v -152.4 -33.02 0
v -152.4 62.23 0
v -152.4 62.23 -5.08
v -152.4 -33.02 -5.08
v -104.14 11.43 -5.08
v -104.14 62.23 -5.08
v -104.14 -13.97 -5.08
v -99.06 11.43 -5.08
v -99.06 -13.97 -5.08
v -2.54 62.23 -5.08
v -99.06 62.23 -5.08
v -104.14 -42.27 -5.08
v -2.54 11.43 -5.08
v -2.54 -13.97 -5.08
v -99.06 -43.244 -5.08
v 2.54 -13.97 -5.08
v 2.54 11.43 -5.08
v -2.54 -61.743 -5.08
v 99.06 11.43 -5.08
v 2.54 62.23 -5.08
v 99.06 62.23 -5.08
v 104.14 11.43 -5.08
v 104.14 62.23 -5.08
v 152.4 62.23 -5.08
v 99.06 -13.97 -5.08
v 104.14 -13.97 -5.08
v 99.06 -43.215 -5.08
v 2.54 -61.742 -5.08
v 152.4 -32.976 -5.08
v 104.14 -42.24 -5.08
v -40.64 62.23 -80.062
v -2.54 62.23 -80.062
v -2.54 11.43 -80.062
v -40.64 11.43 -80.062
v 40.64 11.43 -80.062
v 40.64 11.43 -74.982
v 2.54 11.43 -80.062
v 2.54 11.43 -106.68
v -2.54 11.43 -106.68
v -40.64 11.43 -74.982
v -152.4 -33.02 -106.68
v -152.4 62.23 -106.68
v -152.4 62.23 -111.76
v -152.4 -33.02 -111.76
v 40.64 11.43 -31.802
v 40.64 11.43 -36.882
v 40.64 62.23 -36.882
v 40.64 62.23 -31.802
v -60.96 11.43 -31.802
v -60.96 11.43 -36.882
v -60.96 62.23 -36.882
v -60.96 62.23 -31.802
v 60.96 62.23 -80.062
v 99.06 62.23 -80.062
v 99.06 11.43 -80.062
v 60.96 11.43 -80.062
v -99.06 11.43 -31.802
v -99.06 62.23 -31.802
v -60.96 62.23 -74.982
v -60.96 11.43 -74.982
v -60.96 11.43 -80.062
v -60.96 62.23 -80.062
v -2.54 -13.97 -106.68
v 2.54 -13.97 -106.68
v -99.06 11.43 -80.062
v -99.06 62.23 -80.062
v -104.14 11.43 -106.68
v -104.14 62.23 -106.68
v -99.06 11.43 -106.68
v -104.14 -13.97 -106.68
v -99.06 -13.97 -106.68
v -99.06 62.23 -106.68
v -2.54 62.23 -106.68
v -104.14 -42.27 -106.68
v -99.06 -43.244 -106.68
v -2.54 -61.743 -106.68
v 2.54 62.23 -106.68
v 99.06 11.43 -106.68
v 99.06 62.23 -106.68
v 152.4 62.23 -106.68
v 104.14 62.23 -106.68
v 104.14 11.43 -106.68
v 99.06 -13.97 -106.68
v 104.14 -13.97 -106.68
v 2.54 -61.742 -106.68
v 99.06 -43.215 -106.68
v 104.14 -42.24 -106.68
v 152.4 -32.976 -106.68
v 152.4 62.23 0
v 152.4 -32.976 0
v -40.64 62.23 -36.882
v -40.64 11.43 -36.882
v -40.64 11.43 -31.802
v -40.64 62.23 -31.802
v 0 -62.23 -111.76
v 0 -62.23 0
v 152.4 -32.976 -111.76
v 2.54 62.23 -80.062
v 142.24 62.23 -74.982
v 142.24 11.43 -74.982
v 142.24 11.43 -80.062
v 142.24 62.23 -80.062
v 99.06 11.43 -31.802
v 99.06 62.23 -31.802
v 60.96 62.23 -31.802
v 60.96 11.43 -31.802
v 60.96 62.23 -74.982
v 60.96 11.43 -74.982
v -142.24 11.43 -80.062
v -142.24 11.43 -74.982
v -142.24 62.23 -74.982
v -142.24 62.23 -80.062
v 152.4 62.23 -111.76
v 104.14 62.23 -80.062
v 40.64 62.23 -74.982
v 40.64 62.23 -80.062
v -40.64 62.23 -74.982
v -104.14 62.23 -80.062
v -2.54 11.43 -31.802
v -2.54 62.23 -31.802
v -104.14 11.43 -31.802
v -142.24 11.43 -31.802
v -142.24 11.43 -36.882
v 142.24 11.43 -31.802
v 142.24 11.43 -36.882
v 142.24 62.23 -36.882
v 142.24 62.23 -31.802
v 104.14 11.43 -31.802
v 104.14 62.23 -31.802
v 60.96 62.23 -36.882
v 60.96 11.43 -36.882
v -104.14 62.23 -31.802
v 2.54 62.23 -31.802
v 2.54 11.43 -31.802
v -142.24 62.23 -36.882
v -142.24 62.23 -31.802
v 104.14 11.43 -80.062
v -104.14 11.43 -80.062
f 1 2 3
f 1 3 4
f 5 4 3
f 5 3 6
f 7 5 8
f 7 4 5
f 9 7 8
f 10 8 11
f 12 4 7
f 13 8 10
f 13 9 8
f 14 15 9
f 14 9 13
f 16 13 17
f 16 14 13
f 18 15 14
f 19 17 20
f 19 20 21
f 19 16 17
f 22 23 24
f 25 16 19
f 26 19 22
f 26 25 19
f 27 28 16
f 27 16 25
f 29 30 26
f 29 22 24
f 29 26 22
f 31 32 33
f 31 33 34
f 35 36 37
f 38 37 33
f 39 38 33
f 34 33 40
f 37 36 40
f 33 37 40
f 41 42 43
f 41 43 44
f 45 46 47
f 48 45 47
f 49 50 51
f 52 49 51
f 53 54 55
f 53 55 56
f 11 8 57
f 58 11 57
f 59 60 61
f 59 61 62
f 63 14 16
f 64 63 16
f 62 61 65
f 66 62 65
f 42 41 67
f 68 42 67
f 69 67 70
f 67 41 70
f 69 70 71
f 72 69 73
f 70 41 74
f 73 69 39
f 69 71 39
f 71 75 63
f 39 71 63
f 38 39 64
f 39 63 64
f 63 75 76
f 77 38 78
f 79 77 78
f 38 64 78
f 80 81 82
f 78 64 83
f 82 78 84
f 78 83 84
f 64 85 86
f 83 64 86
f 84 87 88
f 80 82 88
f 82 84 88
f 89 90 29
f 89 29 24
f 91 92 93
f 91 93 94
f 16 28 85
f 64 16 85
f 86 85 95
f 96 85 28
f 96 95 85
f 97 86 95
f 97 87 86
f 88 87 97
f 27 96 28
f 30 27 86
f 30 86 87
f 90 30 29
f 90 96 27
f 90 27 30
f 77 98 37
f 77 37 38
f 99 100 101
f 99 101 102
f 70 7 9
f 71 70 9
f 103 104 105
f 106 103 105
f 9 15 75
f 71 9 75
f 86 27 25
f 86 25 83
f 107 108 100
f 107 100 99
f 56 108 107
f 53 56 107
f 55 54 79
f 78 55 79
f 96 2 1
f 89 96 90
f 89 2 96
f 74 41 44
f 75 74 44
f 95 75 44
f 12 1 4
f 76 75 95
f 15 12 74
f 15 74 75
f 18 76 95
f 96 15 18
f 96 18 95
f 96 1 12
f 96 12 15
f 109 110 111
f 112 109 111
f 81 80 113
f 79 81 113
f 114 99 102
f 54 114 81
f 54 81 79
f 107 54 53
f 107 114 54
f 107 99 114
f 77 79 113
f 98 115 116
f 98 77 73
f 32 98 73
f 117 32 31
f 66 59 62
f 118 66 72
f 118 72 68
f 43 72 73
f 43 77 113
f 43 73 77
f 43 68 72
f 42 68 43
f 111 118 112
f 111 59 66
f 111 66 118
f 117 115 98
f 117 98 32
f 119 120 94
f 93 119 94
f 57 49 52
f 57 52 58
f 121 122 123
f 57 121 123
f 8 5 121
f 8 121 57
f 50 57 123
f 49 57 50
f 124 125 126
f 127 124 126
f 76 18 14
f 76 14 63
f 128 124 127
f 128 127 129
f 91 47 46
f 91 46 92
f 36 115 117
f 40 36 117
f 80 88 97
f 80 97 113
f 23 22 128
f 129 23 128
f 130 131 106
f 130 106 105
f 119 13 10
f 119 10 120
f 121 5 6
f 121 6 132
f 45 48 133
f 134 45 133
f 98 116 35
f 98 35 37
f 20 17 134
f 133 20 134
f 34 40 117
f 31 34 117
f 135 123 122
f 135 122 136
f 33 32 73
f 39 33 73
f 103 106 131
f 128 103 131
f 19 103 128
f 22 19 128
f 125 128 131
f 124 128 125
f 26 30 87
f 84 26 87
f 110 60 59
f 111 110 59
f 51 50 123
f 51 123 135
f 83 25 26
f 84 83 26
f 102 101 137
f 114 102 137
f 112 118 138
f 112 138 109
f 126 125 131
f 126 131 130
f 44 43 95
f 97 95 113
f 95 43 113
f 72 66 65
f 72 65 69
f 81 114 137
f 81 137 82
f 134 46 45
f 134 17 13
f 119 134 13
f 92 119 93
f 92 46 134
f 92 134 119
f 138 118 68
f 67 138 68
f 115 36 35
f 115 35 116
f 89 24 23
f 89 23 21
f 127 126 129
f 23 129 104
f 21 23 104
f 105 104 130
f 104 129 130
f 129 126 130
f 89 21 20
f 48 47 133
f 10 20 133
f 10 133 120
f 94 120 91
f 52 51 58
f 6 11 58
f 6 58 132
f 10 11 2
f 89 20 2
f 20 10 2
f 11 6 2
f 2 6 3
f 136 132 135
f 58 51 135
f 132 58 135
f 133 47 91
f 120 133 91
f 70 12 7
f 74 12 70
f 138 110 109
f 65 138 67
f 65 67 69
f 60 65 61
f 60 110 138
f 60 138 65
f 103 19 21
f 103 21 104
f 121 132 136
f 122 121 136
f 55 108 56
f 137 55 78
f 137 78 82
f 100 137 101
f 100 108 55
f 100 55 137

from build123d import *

# Parameters (mm, degrees)
BOSS_EXTRUDE1_DEPTH     = 111.76
SKETCH5_W               = 304.8
SKETCH5_H               = 25.4
CUT_EXTRUDE3_DEPTH      = 101.6
CUT_EXTRUDE4_DEPTH      = 227.288199427
CUT_EXTRUDE4_DEPTH_BACK = 227.288199427
SKETCH3_W               = 96.52
SKETCH3_H               = 101.6
SKETCH3_W_2             = 48.26
CUT_EXTRUDE5_REACH      = 288.663
SKETCH6_W               = 38.1
SKETCH6_H               = 50.8
SKETCH7_W               = 81.28
SKETCH7_H               = 50.8
BOSS_EXTRUDE2_DEPTH     = 5.08


with BuildPart() as part:
    # Sketch1 → Boss-Extrude1 (new body)
    with BuildSketch(Plane.XY):
        Polygon((-152.4, 62.23), (-152.4, -33.02), (0, -62.23), (152.4, -32.976439839), (152.4, 62.23), align=None)
    extrude(amount=-BOSS_EXTRUDE1_DEPTH)

    # Sketch5 → Cut-Extrude3 (cut)
    with BuildSketch(Plane.XY.offset(-5.08)):
        with Locations((0, -1.27)):
            Rectangle(SKETCH5_W, SKETCH5_H)
    extrude(amount=-CUT_EXTRUDE3_DEPTH, mode=Mode.SUBTRACT)

    # Sketch3 → Cut-Extrude4 (cut, two sides: drawn at the far end of the back side and taken through both)
    with BuildSketch(Plane(origin=(0, 62.23, 0), x_dir=(1, 0, 0), z_dir=(0, 1, 0)).offset(-CUT_EXTRUDE4_DEPTH_BACK)):
        with Locations((-50.8, 55.88)):
            Rectangle(SKETCH3_W, SKETCH3_H)
        with Locations((50.8, 55.88)):
            Rectangle(SKETCH3_W, SKETCH3_H)
        with Locations((-128.27, 55.88)):
            Rectangle(SKETCH3_W_2, SKETCH3_H)
        with Locations((128.27, 55.88)):
            Rectangle(SKETCH3_W_2, SKETCH3_H)
    extrude(amount=CUT_EXTRUDE4_DEPTH + CUT_EXTRUDE4_DEPTH_BACK, mode=Mode.SUBTRACT)

    # Cut-Extrude5: up to this face of the body (flat: up to its plane)
    cut_extrude5_end = Plane(part.part.faces().sort_by_distance((104.14, 36.83, -55.88))[0])
    # Sketch6 → Cut-Extrude5 (cut, up to the picked face)
    with BuildSketch(Plane.ZY.offset(104.14), mode=Mode.PRIVATE) as cut_extrude5_sk1:
        with Locations((-55.932057734, 36.83)):
            Rectangle(SKETCH6_W, SKETCH6_H)
    cut_extrude5_tool1 = split(extrude(cut_extrude5_sk1.sketch, amount=-CUT_EXTRUDE5_REACH, mode=Mode.PRIVATE), bisect_by=cut_extrude5_end, keep=Keep.BOTH, mode=Mode.PRIVATE)
    add(cut_extrude5_tool1.solids().sort_by(Axis((-104.14, 36.83, -55.932058), (1, 0, 0)))[0], mode=Mode.SUBTRACT)

    # Sketch7 → Boss-Extrude2 (add)
    with BuildSketch(Plane(origin=(0, 0, -36.882057734), x_dir=(-1, 0, 0), z_dir=(0, 0, -1))):
        with Locations((0, 36.83)):
            Rectangle(SKETCH7_W, SKETCH7_H)
        with Locations((101.6, 36.83)):
            Rectangle(SKETCH7_W, SKETCH7_H)
        with Locations((-101.6, 36.83)):
            Rectangle(SKETCH7_W, SKETCH7_H)
    boss_extrude2 = extrude(amount=-BOSS_EXTRUDE2_DEPTH)

    # Mirror1: Boss-Extrude2 across plane
    add(boss_extrude2.mirror(Plane(origin=(0, 0, -55.932057734), x_dir=(1, 0, 0), z_dir=(0, 0, -1))))


solid = part.part
